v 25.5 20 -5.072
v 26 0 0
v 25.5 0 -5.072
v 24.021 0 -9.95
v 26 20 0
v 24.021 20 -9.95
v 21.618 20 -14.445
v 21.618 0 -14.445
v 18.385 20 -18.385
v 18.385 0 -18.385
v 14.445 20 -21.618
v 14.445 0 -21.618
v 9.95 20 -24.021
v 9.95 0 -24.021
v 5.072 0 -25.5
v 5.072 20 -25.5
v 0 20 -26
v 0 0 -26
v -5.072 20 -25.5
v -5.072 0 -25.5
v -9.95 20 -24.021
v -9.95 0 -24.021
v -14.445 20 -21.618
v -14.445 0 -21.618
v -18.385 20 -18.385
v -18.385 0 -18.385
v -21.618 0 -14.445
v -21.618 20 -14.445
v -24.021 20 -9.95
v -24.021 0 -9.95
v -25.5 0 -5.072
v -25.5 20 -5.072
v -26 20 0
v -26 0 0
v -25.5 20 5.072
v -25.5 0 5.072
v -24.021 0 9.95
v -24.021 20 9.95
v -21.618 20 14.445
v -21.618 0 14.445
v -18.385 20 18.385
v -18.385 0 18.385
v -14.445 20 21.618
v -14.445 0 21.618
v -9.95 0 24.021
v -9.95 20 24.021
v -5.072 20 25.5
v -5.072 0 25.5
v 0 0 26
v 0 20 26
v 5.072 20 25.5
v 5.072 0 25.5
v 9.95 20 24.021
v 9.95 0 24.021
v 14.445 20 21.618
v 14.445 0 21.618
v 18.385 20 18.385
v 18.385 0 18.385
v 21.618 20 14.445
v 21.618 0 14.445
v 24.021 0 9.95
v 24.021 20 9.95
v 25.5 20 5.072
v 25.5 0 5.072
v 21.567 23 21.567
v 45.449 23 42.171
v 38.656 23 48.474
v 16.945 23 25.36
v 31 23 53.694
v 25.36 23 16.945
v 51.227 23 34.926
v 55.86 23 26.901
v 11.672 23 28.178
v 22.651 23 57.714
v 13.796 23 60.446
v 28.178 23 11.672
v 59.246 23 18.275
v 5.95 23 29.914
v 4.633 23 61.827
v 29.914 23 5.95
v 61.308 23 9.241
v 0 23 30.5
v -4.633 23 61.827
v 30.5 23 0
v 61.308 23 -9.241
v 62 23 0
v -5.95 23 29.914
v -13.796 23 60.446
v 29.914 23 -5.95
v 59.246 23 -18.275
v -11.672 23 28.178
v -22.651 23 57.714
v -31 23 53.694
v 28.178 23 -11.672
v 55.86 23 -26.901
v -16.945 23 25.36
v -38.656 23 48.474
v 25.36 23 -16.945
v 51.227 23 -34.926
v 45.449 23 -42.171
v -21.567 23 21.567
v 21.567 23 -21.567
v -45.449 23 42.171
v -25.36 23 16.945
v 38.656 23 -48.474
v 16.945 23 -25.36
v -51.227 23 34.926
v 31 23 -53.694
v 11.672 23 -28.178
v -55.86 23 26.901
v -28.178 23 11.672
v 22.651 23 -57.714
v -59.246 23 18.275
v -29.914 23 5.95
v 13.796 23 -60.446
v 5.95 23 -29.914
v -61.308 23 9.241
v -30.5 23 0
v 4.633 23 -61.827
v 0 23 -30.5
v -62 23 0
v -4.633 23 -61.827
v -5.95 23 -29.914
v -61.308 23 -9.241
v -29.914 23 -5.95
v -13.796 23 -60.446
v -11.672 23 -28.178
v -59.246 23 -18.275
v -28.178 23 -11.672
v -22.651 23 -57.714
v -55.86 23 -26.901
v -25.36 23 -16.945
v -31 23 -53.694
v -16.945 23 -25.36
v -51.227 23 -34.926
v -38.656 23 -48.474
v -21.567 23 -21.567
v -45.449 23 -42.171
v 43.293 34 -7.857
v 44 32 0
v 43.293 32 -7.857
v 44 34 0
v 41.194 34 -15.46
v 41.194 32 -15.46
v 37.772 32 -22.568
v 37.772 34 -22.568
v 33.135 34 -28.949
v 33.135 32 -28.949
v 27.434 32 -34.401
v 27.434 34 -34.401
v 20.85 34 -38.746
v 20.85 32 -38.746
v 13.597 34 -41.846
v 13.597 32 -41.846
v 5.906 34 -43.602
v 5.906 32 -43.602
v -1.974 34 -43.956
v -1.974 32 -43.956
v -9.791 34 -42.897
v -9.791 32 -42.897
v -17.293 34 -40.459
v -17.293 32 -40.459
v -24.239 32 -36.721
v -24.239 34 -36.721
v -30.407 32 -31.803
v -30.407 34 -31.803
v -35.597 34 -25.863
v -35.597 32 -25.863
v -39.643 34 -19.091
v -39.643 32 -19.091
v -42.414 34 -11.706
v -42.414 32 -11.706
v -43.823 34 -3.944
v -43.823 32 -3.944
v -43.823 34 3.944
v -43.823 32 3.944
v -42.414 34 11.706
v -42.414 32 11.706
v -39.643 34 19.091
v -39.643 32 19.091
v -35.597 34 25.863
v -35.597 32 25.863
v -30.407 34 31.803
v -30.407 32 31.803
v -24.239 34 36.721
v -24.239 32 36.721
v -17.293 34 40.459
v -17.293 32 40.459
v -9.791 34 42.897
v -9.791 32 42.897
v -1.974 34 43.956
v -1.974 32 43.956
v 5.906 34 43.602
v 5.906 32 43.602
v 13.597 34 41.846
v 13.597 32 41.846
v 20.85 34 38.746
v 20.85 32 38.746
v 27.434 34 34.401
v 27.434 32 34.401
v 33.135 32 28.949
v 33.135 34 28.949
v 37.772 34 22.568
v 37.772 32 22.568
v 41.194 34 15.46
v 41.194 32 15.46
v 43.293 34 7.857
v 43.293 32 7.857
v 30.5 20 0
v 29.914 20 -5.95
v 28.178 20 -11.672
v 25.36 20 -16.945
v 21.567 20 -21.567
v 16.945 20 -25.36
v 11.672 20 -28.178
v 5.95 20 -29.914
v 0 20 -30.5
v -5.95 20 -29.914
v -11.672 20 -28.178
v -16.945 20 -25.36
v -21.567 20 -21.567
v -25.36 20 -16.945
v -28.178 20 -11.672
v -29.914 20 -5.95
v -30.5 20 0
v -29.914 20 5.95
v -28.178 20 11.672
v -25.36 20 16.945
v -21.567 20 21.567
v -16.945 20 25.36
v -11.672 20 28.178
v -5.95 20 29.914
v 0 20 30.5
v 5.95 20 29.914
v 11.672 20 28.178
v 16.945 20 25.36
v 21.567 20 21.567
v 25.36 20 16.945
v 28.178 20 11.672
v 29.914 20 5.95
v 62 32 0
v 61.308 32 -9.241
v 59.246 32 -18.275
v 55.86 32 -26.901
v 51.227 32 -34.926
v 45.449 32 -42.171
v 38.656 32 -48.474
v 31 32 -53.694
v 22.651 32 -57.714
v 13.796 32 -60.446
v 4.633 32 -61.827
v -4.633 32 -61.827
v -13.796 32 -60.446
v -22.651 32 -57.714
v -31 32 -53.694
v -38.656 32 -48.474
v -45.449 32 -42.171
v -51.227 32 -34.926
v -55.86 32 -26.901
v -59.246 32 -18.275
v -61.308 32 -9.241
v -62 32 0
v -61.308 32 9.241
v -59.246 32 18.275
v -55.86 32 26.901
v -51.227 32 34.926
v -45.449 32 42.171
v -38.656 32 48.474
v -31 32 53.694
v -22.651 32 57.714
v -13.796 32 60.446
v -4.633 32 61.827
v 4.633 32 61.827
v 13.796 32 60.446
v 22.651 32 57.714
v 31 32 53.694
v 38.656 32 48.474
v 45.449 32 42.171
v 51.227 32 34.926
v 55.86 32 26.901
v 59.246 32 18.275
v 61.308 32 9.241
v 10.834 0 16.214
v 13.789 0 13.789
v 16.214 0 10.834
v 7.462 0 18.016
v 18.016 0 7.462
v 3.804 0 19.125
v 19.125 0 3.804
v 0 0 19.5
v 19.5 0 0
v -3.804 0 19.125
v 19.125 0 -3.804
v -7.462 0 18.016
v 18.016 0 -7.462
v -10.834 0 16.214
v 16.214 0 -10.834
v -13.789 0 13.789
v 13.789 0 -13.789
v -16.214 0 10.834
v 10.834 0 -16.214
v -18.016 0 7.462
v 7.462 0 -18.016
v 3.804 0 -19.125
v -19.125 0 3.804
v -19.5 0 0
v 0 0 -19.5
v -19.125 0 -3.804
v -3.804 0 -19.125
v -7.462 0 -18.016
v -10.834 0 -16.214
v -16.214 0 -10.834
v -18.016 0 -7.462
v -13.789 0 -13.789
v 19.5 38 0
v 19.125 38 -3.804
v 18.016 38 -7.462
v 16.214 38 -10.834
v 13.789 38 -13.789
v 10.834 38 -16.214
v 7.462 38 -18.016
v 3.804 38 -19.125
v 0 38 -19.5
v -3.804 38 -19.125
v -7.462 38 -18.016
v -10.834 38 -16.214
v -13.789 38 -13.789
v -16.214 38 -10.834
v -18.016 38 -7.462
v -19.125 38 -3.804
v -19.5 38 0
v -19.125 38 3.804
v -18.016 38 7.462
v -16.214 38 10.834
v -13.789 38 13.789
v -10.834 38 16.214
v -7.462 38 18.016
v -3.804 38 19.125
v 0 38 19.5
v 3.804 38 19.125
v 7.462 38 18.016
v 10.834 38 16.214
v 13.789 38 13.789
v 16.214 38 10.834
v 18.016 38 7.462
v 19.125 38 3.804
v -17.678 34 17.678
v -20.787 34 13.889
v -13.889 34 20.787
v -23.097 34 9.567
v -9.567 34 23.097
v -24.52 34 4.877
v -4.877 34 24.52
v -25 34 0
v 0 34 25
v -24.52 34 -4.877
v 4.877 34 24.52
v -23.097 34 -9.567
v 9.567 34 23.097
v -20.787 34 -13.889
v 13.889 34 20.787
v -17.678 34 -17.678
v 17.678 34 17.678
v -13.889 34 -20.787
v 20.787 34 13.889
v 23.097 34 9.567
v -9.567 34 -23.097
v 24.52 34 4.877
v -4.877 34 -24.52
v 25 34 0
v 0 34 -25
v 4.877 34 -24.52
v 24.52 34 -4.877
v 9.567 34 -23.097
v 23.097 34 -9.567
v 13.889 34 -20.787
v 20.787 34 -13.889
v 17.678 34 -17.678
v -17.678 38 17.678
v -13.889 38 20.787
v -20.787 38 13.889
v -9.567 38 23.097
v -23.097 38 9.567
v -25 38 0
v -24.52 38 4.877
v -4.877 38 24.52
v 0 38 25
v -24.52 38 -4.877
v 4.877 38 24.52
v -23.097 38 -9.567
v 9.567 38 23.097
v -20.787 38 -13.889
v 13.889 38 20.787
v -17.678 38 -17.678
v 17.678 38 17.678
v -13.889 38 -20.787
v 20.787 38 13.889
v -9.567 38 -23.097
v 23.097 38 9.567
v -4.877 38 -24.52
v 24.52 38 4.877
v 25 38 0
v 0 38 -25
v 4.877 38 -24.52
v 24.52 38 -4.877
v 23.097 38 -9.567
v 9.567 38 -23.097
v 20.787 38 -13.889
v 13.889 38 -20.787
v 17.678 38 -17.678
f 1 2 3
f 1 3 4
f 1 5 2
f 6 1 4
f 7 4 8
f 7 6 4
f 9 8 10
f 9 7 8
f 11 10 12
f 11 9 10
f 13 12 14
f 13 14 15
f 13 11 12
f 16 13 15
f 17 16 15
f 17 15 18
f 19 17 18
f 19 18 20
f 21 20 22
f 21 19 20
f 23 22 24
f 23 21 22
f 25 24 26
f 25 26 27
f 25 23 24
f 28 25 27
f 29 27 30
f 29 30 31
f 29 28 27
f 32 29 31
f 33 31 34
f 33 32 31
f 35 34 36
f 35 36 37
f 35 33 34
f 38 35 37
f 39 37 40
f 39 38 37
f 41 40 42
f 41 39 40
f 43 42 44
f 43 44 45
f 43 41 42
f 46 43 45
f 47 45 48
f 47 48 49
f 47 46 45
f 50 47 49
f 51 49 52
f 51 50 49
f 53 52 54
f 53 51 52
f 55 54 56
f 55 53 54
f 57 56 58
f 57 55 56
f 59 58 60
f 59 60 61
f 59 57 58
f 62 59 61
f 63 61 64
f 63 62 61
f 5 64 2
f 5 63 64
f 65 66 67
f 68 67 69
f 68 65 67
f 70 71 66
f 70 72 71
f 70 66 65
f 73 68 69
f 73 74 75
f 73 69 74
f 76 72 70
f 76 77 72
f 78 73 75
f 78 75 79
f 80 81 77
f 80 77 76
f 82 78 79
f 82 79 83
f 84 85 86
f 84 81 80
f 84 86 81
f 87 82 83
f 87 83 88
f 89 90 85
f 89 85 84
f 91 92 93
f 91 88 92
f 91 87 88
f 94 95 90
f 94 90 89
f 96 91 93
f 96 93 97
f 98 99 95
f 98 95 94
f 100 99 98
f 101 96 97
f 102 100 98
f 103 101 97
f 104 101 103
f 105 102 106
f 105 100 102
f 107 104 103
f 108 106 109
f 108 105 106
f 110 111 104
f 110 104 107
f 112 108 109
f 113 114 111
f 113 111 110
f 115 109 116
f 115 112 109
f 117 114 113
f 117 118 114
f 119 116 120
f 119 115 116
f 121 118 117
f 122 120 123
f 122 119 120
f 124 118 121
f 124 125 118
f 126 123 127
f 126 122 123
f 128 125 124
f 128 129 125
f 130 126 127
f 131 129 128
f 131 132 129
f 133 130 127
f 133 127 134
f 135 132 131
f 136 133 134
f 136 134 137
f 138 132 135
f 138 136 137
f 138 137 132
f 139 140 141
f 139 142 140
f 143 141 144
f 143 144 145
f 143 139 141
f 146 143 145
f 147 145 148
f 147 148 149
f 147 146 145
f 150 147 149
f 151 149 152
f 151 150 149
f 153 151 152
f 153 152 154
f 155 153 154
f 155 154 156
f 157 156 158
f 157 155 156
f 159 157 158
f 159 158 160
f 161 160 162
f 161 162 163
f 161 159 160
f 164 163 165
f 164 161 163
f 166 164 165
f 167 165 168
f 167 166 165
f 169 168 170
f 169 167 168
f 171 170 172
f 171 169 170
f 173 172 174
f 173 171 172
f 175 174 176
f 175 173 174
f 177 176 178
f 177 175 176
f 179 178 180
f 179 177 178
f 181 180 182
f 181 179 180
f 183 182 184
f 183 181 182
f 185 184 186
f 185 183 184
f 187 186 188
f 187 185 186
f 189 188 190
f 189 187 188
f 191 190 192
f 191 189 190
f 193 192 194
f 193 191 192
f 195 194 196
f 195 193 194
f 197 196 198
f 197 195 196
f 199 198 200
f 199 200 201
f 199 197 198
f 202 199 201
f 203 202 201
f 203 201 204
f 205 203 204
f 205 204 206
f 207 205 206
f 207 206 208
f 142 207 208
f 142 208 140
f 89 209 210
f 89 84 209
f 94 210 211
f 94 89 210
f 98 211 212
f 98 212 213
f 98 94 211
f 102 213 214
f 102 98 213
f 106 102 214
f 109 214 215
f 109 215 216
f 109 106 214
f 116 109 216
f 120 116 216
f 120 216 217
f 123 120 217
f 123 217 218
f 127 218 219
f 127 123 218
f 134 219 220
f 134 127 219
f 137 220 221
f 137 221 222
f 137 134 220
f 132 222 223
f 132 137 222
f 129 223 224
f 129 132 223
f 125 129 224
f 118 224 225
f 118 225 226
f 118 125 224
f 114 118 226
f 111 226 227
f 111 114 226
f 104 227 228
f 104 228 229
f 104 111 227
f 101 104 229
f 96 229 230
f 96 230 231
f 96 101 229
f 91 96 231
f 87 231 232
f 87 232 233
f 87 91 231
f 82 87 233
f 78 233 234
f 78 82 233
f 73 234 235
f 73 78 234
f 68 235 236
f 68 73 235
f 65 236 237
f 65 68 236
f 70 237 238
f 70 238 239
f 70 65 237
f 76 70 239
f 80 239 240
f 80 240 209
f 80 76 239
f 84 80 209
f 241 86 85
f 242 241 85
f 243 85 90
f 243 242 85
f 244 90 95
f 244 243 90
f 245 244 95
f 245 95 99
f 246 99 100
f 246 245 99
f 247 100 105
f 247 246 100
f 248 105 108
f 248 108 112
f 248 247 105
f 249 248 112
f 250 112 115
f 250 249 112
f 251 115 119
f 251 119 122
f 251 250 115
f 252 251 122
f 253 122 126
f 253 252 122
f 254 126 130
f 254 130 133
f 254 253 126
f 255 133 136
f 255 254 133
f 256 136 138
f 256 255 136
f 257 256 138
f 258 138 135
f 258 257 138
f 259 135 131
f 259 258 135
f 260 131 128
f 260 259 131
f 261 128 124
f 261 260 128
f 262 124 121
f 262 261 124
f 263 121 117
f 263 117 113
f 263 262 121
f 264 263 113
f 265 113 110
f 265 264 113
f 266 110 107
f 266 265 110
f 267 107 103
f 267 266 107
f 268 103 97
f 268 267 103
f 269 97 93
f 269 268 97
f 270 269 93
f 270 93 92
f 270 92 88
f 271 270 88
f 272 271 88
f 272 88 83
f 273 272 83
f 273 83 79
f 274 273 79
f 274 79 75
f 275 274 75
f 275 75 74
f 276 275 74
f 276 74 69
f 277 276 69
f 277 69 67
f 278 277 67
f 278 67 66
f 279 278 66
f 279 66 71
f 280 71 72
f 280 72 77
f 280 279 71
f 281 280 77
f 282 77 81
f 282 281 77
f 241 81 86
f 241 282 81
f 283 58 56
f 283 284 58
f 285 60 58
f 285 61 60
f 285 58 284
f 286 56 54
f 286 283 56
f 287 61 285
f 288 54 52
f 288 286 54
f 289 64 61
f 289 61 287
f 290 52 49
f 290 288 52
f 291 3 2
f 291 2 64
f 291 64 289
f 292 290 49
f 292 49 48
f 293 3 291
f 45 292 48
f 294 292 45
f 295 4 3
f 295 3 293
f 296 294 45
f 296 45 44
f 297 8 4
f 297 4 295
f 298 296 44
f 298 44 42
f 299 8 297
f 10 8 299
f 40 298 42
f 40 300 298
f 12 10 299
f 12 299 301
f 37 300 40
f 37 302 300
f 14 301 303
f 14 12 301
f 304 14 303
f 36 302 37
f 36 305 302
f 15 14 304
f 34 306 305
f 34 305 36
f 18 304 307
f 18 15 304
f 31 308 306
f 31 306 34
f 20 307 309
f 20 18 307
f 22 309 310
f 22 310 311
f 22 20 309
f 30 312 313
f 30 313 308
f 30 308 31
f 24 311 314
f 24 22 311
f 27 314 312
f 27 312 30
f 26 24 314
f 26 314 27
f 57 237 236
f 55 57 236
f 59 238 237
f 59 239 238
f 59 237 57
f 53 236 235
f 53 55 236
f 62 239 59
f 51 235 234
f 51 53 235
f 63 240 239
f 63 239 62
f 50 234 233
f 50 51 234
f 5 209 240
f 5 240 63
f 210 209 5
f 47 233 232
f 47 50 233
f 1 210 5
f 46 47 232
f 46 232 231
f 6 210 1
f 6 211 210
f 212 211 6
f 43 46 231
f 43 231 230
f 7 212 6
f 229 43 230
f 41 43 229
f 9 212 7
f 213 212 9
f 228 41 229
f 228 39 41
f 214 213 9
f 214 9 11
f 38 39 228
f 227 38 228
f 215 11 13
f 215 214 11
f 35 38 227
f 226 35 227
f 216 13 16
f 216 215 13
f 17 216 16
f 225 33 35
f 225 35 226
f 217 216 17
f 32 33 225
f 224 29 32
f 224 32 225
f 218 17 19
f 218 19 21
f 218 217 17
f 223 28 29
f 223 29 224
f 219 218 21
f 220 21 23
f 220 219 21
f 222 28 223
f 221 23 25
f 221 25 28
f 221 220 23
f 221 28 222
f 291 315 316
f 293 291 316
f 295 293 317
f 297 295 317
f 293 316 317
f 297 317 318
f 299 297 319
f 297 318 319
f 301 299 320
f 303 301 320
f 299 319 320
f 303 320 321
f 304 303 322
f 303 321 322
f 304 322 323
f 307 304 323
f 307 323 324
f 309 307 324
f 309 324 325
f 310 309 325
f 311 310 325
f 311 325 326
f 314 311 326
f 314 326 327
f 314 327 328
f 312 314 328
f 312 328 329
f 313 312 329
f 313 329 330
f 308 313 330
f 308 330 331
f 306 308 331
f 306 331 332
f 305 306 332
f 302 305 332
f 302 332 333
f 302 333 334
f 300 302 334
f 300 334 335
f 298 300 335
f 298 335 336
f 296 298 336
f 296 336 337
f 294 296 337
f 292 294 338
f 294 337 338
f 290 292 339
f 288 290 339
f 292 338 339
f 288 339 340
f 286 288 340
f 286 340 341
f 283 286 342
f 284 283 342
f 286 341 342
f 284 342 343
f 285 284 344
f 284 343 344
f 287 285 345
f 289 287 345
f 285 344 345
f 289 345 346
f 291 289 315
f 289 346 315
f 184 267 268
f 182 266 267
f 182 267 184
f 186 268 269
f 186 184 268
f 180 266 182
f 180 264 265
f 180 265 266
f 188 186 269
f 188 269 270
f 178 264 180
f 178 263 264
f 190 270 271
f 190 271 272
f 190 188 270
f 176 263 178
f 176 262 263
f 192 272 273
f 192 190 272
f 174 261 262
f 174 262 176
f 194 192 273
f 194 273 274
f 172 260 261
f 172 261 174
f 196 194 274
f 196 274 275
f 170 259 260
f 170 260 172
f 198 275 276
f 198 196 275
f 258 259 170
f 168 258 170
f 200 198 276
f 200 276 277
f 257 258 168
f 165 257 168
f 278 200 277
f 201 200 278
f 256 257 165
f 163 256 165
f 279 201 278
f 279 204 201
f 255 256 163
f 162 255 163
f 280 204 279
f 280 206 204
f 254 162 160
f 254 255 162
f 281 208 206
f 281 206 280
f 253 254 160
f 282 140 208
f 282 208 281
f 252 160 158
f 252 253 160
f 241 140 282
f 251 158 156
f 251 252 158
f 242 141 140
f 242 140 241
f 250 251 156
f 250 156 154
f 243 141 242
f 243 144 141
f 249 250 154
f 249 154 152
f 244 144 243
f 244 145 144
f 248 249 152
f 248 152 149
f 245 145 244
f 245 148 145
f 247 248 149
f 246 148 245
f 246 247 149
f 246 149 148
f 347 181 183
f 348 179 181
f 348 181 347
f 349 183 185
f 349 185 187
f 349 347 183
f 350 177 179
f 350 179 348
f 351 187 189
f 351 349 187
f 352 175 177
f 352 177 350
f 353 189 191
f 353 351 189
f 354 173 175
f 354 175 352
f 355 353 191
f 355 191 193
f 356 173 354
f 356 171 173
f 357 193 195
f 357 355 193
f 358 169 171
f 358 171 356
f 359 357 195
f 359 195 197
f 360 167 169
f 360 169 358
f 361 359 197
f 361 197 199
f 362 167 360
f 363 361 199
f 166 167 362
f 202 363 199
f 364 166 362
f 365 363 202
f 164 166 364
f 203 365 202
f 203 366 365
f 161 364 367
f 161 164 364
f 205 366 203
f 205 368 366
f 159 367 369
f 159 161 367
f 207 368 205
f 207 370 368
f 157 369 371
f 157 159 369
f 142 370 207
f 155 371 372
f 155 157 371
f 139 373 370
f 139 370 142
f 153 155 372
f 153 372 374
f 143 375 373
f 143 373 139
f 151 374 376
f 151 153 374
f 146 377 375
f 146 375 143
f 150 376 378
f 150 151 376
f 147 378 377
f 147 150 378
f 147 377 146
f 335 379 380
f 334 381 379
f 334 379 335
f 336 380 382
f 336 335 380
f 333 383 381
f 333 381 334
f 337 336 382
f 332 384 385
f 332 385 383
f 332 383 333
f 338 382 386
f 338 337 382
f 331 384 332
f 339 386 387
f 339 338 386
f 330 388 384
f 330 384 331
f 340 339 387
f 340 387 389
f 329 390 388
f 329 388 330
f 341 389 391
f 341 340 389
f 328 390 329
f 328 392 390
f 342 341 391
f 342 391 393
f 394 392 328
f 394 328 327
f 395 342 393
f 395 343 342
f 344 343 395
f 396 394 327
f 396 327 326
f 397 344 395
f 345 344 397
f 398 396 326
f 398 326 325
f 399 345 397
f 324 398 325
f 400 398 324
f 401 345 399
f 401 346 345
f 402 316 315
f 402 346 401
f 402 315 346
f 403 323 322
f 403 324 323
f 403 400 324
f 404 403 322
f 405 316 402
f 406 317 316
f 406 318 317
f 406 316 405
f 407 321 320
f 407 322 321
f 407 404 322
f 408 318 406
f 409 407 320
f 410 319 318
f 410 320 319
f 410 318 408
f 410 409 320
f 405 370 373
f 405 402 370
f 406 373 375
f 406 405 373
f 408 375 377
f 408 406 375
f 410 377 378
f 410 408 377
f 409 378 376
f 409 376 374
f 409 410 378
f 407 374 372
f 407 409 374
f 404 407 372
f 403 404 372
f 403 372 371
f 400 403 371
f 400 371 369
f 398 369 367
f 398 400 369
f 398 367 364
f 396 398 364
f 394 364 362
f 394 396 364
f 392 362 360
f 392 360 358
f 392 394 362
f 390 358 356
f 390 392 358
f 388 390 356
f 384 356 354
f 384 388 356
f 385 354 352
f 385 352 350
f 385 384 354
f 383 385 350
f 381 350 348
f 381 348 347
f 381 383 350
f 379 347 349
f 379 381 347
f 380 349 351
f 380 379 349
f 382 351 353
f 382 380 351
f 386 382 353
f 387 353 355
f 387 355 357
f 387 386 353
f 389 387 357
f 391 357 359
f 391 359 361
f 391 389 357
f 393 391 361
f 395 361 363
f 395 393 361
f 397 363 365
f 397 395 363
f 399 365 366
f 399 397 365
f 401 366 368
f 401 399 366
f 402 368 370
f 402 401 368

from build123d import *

# Parameters (mm, degrees)
SKETCH3_R          = 19.5
CUT_EXTRUDE1_DEPTH = 50


with BuildPart() as part:
    # Sketch2 → Revolve1 (revolve)
    with BuildSketch(Plane.XY):
        Polygon((0, 0), (26, 0), (26, 20), (30.5, 20), (30.5, 23), (62, 23), (62, 32), (44, 32), (44, 34), (25, 34), (25, 38), (0, 38), align=None)
    revolve(axis=Axis((0, 0, 0), (0, 1, 0)))

    # Sketch3 → Cut-Extrude1 (cut)
    with BuildSketch(Plane(origin=(0, 38, 0), x_dir=(1, 0, 0), z_dir=(0, 1, 0))):
        Circle(SKETCH3_R)
    extrude(amount=-CUT_EXTRUDE1_DEPTH, mode=Mode.SUBTRACT)


solid = part.part
